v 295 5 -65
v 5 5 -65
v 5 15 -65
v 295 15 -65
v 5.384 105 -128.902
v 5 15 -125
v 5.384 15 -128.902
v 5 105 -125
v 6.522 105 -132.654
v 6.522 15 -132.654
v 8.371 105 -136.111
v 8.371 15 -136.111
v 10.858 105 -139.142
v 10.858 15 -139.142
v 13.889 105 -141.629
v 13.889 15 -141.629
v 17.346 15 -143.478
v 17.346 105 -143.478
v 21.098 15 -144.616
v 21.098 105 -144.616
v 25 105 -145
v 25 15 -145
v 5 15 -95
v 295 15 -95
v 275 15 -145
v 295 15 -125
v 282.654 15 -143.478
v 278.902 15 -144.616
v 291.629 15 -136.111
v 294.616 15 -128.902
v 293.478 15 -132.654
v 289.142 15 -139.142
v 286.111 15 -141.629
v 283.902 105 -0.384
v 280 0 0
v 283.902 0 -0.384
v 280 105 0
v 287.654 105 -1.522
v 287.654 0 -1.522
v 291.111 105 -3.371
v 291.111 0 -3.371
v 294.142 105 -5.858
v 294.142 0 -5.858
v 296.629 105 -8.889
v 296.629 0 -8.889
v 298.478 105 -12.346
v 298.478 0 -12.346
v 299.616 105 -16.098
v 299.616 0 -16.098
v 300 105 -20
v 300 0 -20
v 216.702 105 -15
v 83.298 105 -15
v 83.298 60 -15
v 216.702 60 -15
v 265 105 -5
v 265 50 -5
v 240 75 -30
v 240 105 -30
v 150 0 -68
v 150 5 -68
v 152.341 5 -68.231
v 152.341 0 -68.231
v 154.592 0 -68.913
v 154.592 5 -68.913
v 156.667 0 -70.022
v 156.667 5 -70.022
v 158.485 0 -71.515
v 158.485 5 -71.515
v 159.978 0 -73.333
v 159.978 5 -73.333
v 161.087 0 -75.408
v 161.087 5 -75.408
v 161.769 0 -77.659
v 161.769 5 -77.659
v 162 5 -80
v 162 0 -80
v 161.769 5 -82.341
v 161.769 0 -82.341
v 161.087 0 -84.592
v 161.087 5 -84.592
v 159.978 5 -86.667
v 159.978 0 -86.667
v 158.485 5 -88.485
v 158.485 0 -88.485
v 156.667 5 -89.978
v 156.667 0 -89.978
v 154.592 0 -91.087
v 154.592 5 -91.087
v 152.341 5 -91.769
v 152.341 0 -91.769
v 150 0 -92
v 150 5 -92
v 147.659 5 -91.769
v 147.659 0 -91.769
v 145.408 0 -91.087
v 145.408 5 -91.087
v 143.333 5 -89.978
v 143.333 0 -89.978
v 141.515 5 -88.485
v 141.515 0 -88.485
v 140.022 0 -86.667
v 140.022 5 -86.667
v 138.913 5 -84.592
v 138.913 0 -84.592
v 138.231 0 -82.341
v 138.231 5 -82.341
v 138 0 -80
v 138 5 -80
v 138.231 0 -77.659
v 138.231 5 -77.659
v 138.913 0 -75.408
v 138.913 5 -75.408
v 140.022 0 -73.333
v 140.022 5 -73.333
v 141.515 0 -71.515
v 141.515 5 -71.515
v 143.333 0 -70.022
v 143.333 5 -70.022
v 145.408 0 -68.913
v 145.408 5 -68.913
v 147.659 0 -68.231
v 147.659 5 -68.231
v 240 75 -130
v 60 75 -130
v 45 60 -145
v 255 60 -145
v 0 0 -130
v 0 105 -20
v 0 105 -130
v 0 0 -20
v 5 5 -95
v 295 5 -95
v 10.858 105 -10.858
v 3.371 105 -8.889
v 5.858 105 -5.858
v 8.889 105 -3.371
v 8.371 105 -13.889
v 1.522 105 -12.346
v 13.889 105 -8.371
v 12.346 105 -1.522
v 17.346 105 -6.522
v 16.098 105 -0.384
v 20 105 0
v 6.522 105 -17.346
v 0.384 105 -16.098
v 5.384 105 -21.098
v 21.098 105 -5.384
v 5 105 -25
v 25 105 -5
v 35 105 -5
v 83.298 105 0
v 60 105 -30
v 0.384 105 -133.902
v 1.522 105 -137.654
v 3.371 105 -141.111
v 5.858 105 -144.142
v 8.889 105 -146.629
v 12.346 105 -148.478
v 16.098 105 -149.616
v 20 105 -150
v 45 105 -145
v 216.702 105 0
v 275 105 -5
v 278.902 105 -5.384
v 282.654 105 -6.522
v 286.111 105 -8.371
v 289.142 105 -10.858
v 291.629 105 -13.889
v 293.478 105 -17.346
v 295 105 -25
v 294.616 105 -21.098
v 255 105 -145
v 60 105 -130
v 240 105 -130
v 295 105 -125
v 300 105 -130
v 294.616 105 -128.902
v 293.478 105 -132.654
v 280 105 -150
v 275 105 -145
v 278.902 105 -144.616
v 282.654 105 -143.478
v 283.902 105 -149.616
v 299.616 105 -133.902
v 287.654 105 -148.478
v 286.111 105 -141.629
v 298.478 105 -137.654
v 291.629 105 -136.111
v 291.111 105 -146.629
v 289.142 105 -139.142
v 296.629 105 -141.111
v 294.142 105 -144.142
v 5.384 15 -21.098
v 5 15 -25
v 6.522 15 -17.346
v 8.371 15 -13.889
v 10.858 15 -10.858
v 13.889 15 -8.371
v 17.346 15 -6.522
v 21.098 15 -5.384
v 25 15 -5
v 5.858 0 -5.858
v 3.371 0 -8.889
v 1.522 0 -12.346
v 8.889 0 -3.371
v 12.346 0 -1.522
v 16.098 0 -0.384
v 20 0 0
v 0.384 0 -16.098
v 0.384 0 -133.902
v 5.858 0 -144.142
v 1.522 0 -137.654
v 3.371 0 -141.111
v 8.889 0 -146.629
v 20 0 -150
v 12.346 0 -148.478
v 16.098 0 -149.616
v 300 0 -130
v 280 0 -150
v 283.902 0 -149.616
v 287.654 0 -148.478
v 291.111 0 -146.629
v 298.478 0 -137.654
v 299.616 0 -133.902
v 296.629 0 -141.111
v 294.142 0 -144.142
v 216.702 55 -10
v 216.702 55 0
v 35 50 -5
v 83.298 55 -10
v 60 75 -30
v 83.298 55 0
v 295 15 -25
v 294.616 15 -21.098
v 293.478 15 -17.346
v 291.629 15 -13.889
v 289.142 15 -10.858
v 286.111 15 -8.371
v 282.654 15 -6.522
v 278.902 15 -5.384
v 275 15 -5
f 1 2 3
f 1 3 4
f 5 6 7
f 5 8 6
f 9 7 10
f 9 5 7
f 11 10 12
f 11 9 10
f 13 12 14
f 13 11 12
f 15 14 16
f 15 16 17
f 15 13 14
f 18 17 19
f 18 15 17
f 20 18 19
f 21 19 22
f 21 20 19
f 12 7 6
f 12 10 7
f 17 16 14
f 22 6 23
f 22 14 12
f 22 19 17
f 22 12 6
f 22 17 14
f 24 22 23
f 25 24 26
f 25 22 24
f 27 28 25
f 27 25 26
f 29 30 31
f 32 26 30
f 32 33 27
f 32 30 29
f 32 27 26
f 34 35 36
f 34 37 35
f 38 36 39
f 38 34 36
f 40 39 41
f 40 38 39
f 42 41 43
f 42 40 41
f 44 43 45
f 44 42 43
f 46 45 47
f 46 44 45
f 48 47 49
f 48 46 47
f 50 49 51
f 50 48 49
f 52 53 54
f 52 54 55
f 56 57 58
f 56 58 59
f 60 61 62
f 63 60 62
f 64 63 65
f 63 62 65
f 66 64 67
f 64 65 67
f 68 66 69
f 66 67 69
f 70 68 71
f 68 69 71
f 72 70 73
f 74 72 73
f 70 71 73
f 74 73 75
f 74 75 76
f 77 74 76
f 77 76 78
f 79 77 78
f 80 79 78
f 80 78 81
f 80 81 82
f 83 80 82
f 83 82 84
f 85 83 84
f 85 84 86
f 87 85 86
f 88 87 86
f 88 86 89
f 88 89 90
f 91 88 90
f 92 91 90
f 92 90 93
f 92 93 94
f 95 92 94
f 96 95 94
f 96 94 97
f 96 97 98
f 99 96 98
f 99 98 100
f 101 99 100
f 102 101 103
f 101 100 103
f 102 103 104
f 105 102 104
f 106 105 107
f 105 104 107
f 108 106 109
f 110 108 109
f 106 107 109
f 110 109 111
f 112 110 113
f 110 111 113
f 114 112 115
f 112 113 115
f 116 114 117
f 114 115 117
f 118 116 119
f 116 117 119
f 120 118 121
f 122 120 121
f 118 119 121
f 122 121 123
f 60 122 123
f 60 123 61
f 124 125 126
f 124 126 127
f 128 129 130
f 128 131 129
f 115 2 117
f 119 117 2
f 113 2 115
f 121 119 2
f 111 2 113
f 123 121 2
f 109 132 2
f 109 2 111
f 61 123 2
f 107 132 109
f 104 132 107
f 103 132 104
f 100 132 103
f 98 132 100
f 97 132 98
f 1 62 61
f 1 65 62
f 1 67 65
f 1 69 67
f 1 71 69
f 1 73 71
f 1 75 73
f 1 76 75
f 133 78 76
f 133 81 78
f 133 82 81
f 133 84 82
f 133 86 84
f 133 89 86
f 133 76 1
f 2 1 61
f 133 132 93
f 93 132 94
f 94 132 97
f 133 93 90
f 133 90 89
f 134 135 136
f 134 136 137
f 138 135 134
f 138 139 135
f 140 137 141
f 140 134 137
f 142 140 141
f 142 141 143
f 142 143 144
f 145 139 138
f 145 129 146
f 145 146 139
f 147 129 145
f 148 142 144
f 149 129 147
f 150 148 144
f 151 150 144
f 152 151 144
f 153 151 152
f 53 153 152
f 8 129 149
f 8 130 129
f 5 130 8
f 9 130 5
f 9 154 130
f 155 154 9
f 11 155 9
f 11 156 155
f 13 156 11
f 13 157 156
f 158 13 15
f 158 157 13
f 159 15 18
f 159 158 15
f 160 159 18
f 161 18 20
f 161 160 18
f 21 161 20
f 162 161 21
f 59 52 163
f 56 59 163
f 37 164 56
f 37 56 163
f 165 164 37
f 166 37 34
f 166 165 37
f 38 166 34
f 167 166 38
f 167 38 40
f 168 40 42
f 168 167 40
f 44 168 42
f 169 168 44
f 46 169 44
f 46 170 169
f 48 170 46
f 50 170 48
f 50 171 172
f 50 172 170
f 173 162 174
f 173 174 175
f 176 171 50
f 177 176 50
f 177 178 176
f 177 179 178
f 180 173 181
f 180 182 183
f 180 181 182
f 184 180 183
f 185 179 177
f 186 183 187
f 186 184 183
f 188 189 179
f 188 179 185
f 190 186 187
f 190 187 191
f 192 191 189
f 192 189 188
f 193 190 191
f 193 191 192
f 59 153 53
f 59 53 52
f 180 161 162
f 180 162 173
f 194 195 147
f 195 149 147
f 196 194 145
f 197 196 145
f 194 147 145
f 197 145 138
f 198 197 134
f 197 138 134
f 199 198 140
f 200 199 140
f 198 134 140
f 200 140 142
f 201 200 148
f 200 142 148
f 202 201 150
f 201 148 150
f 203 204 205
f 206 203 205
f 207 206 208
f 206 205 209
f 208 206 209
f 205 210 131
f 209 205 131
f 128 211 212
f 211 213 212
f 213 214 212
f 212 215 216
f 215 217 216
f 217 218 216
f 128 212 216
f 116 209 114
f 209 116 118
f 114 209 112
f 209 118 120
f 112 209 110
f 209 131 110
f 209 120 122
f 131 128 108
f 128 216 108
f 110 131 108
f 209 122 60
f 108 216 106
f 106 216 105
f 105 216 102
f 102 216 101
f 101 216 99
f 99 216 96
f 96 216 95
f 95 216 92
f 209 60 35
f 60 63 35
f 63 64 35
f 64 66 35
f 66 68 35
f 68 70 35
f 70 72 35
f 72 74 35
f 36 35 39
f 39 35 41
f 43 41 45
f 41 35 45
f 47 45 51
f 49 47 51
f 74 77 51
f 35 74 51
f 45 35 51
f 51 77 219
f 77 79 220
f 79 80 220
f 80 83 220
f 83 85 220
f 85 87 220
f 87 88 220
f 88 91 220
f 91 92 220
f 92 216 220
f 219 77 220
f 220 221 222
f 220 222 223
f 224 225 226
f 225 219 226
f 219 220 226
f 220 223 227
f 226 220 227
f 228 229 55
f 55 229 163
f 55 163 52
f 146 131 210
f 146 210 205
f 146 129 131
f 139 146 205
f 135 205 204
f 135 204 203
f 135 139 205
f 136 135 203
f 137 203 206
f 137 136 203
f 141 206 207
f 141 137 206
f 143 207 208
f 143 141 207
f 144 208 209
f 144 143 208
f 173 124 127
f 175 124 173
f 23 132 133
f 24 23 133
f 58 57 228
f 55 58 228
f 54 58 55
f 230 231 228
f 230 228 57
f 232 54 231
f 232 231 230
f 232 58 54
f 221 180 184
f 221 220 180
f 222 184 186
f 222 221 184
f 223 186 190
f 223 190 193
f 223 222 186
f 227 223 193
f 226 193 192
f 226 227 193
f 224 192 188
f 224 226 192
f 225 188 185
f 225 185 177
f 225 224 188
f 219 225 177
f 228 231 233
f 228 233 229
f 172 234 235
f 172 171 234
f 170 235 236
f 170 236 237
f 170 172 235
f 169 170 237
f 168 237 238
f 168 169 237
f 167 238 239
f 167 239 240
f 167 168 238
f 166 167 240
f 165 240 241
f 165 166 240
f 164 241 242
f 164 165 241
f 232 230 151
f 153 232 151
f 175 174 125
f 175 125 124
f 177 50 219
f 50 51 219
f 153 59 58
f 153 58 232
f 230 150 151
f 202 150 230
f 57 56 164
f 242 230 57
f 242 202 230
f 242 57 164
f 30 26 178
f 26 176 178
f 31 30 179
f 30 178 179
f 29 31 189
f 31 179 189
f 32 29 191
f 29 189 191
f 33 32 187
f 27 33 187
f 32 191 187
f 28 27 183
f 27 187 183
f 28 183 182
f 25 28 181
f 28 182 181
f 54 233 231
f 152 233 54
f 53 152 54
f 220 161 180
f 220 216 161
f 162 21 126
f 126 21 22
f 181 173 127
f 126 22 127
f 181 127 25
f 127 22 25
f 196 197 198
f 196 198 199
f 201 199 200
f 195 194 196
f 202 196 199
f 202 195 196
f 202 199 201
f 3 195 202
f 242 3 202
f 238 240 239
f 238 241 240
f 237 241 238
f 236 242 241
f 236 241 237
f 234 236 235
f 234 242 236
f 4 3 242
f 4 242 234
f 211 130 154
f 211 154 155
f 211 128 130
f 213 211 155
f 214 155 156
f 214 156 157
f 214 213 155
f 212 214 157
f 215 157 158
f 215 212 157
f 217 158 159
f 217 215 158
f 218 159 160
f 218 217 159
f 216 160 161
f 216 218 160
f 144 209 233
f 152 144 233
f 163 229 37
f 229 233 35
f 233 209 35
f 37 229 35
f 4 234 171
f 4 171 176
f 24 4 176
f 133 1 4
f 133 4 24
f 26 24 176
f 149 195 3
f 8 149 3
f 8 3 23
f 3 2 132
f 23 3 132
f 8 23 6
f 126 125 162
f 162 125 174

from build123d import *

# Parameters (mm, degrees)
SKETCH1_W           = 300
SKETCH1_H           = 150
BOSS_EXTRUDE1_DEPTH = 5
SKETCH3_W           = 300
SKETCH3_H           = 150
SKETCH3_W_2         = 290
SKETCH3_H_2         = 140
BOSS_EXTRUDE2_DEPTH = 100
SKETCH4_W           = 290
SKETCH4_H           = 50
SKETCH4_H_2         = 60
BOSS_EXTRUDE3_DEPTH = 10
SKETCH7_R           = 12
CUT_EXTRUDE1_DEPTH  = 351
FILLET1_R           = 20
SKETCH10_W          = 180
SKETCH10_H          = 30
BOSS_EXTRUDE4_DEPTH = 15
SKETCH11_W          = 180
SKETCH11_H          = 30
BOSS_EXTRUDE5_DEPTH = 25
CHAMFER2_SIZE       = 15
CHAMFER3_SIZE       = 25
SKETCH12_W          = 133.404446906
SKETCH12_H          = 15
CUT_EXTRUDE2_DEPTH  = 50


with BuildPart() as part:
    # Sketch1 → Boss-Extrude1 (new body)
    with BuildSketch(Plane(origin=(0, 0, 0), x_dir=(1, 0, 0), z_dir=(0, 1, 0))):
        with Locations((150, 75)):
            Rectangle(SKETCH1_W, SKETCH1_H)
    extrude(amount=BOSS_EXTRUDE1_DEPTH)

    # Sketch3 → Boss-Extrude2 (add)
    with BuildSketch(Plane(origin=(0, 5, 0), x_dir=(1, 0, 0), z_dir=(0, 1, 0))):
        with Locations((150, 75)):
            Rectangle(SKETCH3_W, SKETCH3_H)
        with Locations((150, 75)):
            Rectangle(SKETCH3_W_2, SKETCH3_H_2, mode=Mode.SUBTRACT)
    extrude(amount=BOSS_EXTRUDE2_DEPTH)

    # Sketch4 → Boss-Extrude3 (add)
    with BuildSketch(Plane(origin=(0, 5, 0), x_dir=(1, 0, 0), z_dir=(0, 1, 0))):
        with Locations((150, 120)):
            Rectangle(SKETCH4_W, SKETCH4_H)
        with Locations((150, 35)):
            Rectangle(SKETCH4_W, SKETCH4_H_2)
    extrude(amount=BOSS_EXTRUDE3_DEPTH)

    # Sketch7 → Cut-Extrude1 (cut, through all)
    with BuildSketch(Plane(origin=(0, 5, 0), x_dir=(1, 0, 0), z_dir=(0, 1, 0))):
        with Locations(Location((150, 80, 0), (0, 0, 270))):
            Circle(SKETCH7_R)
    extrude(amount=-CUT_EXTRUDE1_DEPTH, mode=Mode.SUBTRACT)

    # Fillet1
    fillet1_edges = [part.edges().sort_by_distance(p)[0] for p in [
        (5, 60, -145),
        (5, 60, -5),
        (295, 60, -5),
        (295, 60, -145),
        (0, 52.5, -150),
        (300, 52.5, -150),
        (300, 52.5, 0),
        (0, 52.5, 0),
    ]]
    fillet(fillet1_edges, radius=FILLET1_R)

    # Sketch10 → Boss-Extrude4 (add)
    with BuildSketch(Plane.XY.offset(-145)):
        with Locations((150, 90)):
            Rectangle(SKETCH10_W, SKETCH10_H)
    extrude(amount=BOSS_EXTRUDE4_DEPTH)

    # Sketch11 → Boss-Extrude5 (add)
    with BuildSketch(Plane(origin=(0, 0, -5), x_dir=(-1, 0, 0), z_dir=(0, 0, -1))):
        with Locations((-150, 90)):
            Rectangle(SKETCH11_W, SKETCH11_H)
    extrude(amount=BOSS_EXTRUDE5_DEPTH)

    # Chamfer2
    chamfer2_edges = [part.edges().sort_by_distance(p)[0] for p in [
        (240, 90, -145),
        (150, 75, -145),
        (60, 90, -145),
    ]]
    chamfer(chamfer2_edges, length=CHAMFER2_SIZE - 0.0001)  # a hair under: the kernel refuses the full size

    # Chamfer3
    chamfer3_edges = [part.edges().sort_by_distance(p)[0] for p in [
        (60, 90, -5),
        (150, 75, -5),
        (240, 90, -5),
    ]]
    chamfer(chamfer3_edges, length=CHAMFER3_SIZE - 0.0001)  # a hair under: the kernel refuses the full size

    # Sketch12 → Cut-Extrude2 (cut)
    with BuildSketch(Plane(origin=(0, 105, 0), x_dir=(1, 0, 0), z_dir=(0, 1, 0))):
        with Locations((150, 7.5)):
            Rectangle(SKETCH12_W, SKETCH12_H)
    extrude(amount=-CUT_EXTRUDE2_DEPTH, mode=Mode.SUBTRACT)


solid = part.part
